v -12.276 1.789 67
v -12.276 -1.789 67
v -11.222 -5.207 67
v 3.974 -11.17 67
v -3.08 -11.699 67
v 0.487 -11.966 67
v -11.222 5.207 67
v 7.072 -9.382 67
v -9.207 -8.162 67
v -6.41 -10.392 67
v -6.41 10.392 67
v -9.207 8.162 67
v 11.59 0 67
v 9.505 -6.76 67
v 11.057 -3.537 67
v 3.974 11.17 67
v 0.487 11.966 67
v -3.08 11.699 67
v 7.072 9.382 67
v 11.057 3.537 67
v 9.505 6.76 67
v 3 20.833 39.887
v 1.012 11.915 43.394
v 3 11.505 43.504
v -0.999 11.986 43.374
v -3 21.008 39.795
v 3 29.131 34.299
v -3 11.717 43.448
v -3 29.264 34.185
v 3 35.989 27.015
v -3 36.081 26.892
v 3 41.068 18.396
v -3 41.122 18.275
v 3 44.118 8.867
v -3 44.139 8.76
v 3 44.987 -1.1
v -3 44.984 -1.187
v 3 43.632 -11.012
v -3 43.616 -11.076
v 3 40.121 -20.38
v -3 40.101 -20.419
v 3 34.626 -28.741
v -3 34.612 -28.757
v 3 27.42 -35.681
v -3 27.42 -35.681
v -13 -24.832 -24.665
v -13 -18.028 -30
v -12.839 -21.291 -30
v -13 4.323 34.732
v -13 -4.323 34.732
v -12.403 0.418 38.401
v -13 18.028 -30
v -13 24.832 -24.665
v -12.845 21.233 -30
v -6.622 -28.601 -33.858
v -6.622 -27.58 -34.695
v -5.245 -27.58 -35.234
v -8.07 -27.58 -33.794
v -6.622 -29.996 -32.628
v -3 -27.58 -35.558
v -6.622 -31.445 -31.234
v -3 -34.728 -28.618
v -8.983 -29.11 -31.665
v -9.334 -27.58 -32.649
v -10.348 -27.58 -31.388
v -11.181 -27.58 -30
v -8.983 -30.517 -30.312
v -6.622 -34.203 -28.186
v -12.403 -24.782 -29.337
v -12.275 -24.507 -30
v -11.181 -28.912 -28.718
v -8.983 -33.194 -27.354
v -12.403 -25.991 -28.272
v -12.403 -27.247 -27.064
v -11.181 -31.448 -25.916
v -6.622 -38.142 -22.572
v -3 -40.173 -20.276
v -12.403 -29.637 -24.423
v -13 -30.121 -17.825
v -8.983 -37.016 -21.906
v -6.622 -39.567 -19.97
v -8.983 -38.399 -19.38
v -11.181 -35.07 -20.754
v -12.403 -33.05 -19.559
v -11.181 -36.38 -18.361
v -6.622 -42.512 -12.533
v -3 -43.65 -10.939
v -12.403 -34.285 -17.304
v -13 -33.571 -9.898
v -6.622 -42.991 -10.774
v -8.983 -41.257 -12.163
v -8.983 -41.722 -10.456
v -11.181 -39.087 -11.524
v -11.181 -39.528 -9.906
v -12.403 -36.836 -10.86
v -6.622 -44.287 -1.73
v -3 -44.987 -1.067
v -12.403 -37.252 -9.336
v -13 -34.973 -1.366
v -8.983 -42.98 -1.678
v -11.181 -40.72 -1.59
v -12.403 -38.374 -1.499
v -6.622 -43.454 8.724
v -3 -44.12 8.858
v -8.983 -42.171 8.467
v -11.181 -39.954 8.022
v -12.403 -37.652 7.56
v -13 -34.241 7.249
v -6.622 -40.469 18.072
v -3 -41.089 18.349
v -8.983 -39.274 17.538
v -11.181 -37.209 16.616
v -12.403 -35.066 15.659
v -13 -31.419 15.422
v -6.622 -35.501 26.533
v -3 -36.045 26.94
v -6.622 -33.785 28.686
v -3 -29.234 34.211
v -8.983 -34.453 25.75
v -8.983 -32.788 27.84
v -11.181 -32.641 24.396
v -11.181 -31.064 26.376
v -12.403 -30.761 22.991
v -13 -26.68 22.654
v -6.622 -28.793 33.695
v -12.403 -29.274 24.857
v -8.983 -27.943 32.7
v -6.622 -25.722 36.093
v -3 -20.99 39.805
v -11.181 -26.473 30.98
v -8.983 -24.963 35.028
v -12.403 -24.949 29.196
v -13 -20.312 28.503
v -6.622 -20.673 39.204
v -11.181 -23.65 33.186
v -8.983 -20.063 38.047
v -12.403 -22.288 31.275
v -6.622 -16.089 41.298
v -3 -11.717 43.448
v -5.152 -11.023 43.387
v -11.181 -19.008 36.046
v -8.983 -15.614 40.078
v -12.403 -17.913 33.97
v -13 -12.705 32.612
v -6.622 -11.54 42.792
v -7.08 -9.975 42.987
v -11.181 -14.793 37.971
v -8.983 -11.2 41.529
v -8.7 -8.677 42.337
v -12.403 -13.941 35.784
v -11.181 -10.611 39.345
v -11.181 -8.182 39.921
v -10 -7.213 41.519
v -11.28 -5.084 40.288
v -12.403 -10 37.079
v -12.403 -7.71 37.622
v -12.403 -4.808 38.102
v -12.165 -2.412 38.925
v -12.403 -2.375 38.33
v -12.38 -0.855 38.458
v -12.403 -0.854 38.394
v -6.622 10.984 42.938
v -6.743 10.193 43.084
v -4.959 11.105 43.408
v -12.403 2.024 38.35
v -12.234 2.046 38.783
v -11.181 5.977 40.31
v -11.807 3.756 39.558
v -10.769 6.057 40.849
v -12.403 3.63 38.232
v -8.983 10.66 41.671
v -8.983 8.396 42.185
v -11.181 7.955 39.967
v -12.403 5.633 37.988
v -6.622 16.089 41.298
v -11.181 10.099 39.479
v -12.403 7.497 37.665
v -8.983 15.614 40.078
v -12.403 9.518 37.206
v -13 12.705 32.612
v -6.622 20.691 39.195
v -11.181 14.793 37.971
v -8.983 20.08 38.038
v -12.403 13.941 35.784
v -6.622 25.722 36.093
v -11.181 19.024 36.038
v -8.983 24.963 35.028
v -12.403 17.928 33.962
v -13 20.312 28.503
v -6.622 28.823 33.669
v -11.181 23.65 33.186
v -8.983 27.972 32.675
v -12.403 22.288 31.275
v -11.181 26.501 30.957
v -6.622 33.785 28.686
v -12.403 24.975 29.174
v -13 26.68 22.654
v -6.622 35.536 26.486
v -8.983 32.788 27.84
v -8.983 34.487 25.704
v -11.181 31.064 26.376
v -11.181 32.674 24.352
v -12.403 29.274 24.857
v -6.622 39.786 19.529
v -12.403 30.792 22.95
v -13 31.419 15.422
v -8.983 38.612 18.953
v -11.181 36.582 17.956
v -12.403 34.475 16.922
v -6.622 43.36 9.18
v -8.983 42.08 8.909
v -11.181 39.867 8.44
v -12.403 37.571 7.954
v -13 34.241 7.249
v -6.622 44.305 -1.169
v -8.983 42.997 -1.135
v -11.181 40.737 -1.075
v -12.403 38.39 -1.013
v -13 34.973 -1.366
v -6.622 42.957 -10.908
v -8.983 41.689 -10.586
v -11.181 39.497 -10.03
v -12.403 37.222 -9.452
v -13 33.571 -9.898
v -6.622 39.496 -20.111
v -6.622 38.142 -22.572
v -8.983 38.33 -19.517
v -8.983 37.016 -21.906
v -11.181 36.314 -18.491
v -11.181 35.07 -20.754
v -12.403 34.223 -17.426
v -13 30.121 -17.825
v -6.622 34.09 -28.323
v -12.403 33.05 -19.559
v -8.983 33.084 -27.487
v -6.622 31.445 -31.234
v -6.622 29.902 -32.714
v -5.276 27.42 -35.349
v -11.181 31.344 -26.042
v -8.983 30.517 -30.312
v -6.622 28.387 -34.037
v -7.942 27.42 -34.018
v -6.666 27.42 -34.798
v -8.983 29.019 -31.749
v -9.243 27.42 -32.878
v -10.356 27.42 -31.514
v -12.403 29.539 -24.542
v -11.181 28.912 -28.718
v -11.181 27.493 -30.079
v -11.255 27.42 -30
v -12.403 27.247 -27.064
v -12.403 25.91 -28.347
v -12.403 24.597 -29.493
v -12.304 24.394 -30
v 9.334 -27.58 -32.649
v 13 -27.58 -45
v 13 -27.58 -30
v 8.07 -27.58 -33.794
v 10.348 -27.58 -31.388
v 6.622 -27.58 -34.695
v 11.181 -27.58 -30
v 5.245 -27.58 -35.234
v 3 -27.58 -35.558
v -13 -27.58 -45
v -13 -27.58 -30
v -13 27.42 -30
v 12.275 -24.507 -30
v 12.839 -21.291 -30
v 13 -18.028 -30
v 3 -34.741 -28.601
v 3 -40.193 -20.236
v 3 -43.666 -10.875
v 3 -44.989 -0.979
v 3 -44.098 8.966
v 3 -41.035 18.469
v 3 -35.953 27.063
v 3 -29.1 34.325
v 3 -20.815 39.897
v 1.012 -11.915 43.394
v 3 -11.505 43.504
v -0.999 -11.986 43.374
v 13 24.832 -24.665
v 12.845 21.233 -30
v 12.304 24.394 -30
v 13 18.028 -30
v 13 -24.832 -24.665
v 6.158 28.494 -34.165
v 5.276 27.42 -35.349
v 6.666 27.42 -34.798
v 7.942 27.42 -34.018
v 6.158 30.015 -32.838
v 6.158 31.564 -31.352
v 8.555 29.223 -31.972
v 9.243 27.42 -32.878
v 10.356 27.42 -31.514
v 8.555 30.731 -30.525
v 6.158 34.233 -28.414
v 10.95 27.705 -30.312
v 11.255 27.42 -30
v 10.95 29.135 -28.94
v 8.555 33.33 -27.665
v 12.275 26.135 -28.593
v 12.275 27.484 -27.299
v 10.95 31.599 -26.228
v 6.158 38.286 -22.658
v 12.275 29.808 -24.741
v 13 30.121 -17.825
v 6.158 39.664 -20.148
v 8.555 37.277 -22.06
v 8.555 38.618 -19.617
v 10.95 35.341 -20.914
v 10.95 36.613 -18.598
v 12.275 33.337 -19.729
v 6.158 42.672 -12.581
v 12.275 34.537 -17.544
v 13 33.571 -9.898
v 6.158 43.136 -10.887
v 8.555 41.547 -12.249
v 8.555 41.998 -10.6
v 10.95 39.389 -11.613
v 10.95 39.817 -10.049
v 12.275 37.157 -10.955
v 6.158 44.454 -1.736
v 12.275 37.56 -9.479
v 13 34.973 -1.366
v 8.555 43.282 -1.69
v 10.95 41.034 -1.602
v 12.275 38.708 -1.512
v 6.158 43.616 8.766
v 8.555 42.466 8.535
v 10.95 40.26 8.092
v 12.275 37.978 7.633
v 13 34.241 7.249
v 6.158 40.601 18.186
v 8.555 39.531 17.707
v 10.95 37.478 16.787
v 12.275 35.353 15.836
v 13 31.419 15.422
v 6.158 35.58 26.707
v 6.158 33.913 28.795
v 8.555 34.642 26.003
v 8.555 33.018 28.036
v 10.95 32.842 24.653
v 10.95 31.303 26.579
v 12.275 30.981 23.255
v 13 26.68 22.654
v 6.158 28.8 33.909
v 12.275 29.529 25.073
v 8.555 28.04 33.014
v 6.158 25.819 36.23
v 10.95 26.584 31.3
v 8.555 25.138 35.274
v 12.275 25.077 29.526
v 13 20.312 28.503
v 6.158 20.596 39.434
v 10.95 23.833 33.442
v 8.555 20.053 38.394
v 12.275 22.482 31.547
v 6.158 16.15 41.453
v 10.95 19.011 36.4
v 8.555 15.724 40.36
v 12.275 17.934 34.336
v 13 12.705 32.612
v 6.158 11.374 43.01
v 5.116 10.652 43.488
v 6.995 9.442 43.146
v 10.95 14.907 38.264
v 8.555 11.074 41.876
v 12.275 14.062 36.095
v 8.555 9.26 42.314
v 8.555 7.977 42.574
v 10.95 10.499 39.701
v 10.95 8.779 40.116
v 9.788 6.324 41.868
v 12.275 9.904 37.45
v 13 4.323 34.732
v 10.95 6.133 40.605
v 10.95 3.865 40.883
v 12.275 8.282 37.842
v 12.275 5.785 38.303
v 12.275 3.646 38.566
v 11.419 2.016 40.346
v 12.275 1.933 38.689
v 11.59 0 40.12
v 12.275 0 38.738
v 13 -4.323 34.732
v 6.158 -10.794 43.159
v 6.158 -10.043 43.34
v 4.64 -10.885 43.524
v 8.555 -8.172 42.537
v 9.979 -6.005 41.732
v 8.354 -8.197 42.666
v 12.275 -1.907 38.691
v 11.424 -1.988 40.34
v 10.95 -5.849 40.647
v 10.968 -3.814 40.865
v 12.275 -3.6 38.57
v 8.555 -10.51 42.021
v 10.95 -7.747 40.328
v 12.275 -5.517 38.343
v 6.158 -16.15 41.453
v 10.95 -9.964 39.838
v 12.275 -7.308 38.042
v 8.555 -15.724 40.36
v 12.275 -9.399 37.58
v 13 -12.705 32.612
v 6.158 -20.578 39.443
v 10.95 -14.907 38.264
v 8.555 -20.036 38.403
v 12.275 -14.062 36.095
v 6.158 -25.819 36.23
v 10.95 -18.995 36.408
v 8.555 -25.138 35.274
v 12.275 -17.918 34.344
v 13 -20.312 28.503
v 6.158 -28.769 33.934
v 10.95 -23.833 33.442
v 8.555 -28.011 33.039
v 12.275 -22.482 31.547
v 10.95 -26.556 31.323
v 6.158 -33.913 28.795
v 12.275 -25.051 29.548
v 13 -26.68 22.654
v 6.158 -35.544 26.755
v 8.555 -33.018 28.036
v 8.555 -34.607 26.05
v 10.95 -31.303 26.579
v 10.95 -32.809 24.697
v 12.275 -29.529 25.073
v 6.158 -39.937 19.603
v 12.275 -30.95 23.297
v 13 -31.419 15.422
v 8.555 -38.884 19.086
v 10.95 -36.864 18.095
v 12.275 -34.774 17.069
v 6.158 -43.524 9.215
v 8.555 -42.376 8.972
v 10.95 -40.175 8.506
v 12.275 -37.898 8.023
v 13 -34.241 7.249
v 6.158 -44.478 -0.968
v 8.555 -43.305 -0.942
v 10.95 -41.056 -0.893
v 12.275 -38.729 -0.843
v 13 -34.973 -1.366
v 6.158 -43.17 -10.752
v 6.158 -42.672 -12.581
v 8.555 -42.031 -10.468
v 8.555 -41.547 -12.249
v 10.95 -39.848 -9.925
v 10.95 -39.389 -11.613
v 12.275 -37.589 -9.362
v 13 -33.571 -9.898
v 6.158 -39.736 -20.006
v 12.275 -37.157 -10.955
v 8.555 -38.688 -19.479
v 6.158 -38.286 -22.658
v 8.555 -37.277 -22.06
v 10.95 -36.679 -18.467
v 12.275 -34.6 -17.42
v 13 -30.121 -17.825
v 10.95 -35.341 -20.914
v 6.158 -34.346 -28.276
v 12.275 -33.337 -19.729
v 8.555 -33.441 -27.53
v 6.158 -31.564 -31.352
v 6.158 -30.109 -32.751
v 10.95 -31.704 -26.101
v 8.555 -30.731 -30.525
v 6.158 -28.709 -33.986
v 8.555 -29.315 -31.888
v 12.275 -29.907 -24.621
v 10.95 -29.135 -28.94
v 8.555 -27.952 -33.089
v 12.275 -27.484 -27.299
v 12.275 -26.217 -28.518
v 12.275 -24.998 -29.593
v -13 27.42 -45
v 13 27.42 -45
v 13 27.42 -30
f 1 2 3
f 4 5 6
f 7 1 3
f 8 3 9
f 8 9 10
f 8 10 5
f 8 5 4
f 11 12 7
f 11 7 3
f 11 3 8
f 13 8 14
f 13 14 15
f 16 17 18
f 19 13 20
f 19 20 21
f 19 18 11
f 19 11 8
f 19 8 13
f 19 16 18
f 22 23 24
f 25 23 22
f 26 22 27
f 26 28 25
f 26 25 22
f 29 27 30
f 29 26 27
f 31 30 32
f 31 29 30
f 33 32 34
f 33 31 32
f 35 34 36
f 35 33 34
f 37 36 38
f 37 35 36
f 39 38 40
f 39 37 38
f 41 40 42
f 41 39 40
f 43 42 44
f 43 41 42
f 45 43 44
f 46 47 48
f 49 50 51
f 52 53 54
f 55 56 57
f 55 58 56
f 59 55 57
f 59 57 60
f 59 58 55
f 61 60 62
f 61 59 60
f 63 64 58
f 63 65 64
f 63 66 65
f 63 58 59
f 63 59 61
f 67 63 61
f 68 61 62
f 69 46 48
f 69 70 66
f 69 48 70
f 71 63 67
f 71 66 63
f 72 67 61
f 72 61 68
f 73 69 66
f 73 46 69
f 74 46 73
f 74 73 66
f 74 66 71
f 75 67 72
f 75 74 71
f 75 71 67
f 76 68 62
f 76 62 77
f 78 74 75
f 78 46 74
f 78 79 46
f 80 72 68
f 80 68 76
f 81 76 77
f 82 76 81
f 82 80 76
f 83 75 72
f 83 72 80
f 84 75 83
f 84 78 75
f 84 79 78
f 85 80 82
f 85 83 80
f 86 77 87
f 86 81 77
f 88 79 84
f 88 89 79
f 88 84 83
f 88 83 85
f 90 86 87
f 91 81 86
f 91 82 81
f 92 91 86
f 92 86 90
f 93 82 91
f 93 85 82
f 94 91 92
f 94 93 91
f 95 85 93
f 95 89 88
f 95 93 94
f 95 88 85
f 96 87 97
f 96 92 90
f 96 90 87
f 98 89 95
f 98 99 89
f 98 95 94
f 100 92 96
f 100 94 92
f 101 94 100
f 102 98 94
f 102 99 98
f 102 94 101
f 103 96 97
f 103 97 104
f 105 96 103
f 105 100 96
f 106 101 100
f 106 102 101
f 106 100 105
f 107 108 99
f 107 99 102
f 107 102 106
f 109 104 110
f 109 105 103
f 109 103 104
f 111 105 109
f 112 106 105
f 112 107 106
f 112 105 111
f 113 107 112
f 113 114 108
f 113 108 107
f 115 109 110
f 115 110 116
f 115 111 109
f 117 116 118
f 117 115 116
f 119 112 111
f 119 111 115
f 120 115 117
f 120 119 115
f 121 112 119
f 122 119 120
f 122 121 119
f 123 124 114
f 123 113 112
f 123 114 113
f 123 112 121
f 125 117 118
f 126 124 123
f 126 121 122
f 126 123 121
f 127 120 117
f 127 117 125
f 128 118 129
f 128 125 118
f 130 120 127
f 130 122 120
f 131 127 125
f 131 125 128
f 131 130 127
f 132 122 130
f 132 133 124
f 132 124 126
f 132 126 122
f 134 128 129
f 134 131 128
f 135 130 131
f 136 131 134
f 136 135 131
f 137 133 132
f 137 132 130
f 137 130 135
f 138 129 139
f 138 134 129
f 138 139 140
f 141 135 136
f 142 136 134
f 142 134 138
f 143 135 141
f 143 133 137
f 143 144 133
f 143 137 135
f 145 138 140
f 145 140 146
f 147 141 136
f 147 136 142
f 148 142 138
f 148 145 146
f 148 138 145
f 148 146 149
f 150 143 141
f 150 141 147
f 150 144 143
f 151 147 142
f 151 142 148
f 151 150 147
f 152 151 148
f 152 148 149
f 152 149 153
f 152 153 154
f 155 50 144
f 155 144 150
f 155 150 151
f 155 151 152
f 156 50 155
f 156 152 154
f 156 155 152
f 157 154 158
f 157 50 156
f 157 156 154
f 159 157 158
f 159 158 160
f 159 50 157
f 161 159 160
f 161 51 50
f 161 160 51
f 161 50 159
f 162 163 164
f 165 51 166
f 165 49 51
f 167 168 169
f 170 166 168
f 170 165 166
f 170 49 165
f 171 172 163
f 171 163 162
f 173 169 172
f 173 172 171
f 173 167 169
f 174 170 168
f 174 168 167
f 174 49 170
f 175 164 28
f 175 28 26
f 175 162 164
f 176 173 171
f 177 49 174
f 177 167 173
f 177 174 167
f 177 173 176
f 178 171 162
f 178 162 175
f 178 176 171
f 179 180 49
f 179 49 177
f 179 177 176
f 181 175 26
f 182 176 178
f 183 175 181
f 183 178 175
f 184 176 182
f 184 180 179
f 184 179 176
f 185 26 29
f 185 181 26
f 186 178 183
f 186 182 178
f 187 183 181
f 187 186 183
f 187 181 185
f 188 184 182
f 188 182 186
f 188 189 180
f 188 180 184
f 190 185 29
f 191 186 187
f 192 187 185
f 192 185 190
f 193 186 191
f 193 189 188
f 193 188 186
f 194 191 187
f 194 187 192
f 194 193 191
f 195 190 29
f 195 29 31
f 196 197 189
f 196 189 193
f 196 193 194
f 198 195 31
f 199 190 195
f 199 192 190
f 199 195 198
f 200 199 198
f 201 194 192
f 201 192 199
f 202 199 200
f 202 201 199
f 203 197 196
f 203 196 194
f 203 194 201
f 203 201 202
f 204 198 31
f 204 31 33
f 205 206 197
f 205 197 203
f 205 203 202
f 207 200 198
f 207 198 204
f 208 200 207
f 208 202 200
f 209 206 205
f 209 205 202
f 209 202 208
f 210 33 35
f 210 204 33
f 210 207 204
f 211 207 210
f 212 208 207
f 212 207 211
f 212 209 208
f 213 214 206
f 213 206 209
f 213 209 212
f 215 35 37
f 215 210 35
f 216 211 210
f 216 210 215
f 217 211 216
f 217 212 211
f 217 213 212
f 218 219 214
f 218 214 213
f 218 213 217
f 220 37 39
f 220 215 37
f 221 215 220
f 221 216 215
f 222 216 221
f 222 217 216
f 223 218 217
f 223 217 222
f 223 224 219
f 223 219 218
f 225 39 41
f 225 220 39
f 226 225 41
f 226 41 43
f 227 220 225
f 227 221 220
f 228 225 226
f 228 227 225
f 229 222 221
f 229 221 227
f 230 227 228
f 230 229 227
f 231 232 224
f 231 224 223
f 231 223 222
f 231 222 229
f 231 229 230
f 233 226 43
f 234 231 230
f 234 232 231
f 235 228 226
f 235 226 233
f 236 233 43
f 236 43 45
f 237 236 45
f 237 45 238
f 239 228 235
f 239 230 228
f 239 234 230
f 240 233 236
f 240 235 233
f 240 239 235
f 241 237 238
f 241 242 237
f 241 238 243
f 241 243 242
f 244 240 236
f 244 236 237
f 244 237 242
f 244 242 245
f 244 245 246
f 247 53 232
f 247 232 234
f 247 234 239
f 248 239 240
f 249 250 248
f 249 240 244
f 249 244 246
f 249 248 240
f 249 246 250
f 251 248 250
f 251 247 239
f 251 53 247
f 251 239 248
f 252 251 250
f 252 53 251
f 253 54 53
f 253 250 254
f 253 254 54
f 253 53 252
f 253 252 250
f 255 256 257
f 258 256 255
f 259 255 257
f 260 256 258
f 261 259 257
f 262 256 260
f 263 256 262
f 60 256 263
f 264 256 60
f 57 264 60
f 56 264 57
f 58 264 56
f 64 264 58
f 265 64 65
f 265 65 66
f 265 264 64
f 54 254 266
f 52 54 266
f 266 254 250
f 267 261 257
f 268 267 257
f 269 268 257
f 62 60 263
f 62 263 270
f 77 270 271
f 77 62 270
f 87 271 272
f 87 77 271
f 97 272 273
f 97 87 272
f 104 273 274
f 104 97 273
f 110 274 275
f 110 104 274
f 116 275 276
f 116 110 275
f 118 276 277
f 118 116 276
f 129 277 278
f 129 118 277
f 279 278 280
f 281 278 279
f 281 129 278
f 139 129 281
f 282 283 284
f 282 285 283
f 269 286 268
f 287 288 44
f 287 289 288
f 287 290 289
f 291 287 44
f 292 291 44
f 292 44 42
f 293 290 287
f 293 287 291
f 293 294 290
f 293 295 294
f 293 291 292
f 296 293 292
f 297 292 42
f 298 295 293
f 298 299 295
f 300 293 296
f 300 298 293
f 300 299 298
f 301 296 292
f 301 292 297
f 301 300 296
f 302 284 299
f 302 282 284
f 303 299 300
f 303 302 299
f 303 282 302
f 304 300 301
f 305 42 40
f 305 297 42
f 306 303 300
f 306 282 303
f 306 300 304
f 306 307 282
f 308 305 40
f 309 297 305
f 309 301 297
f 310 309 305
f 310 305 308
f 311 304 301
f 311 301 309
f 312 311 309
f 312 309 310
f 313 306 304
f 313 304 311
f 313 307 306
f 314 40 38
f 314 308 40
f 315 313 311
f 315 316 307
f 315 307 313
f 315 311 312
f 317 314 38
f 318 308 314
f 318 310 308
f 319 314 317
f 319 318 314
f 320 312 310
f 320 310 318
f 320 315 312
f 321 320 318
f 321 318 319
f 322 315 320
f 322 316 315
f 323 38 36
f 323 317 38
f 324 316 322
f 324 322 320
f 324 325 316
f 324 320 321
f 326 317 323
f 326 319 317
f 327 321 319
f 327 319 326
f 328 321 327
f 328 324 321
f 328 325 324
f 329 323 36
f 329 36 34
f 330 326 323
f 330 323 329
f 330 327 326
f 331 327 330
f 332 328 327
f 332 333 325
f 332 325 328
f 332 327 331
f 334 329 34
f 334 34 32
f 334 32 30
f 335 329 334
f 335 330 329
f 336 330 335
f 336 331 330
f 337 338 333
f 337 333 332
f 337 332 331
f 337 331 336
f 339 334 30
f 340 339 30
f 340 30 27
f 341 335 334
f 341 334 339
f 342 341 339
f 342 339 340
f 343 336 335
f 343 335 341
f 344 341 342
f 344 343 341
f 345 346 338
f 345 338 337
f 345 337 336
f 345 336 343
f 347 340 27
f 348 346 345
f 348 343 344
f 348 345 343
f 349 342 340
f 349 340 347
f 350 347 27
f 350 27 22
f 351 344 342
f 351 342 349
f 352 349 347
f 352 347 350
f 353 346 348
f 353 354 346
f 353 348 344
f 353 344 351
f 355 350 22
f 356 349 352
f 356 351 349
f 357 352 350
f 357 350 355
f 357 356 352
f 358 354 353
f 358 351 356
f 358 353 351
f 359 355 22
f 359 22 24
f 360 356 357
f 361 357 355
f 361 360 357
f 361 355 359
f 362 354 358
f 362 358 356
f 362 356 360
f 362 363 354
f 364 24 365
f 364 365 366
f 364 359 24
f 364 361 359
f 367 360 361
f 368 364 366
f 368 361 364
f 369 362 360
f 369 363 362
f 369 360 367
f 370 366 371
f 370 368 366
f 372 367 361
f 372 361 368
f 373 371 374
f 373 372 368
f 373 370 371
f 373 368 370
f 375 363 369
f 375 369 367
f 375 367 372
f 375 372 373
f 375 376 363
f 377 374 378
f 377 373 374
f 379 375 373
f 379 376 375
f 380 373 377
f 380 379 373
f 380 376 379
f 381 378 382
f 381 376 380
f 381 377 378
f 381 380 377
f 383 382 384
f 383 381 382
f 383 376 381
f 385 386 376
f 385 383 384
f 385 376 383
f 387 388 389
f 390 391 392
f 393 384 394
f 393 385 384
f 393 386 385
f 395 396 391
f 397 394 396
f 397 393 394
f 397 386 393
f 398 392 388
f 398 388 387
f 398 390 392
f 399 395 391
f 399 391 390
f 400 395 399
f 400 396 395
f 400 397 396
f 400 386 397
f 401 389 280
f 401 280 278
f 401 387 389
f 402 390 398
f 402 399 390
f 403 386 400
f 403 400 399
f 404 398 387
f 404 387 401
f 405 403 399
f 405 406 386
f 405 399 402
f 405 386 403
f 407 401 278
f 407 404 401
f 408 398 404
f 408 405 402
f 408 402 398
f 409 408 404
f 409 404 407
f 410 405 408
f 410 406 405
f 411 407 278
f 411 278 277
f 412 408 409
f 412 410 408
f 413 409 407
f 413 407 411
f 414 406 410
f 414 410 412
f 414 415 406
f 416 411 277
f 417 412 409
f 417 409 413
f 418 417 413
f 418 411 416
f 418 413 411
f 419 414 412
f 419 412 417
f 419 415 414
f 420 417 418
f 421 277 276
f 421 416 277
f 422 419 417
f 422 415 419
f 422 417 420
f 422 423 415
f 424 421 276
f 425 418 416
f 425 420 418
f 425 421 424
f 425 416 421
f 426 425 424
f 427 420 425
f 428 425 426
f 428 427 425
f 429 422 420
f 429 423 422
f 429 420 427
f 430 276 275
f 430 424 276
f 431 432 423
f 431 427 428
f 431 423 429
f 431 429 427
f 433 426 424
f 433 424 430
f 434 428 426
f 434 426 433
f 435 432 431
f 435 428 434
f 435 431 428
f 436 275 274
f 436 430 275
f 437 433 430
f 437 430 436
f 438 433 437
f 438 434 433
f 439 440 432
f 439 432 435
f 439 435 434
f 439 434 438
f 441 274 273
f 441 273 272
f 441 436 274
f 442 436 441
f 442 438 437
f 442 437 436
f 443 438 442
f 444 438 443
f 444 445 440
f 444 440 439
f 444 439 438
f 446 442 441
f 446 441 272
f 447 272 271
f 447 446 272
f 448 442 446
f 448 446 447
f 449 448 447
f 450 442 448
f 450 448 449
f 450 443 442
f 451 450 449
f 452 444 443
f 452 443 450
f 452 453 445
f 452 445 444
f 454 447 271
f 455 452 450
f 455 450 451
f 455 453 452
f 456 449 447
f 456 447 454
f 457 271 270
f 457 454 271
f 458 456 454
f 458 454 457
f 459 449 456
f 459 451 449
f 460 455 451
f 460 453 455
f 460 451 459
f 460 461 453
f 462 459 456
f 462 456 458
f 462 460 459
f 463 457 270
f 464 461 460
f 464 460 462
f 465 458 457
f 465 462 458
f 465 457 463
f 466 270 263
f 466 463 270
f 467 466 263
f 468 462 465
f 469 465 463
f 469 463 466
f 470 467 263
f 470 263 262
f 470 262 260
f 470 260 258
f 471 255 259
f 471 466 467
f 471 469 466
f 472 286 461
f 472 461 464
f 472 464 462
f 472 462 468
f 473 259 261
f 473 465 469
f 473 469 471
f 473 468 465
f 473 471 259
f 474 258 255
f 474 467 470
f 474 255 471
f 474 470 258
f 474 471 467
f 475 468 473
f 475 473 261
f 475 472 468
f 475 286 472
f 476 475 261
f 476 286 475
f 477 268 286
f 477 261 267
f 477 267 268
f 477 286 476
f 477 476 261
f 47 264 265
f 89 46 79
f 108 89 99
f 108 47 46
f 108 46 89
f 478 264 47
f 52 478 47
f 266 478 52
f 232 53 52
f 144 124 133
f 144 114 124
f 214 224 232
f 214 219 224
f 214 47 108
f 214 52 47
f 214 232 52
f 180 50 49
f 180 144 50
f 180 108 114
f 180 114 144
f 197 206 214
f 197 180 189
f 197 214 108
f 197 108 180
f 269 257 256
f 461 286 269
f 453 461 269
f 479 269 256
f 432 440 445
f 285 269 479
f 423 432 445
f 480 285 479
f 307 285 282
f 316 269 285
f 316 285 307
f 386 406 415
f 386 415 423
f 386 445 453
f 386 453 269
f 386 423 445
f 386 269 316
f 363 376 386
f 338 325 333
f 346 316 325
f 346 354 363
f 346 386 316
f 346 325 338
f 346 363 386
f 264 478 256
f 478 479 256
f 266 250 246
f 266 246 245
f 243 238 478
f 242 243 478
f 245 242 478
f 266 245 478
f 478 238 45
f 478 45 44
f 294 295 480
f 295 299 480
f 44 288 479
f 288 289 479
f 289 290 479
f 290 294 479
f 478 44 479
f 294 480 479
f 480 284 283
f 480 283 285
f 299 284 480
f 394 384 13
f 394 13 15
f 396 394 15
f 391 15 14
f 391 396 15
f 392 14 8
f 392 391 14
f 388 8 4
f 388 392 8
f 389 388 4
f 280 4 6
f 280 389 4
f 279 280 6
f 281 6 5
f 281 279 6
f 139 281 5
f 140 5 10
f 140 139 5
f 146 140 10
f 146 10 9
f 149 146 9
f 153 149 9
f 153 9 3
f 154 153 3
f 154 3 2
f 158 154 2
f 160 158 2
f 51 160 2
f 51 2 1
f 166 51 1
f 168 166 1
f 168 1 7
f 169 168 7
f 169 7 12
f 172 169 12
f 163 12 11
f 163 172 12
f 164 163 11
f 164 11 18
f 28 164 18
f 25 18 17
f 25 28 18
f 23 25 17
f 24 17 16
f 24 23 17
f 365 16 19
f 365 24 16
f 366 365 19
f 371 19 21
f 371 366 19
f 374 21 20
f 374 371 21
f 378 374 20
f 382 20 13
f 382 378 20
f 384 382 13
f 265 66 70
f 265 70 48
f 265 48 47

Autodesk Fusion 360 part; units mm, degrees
sketch "Sketch1" plane through (0, 0, 0) normal (1, 0, 0) x (0, 1, 0)
  circle A0 centre (0, 0) radius 45
  line L0 (27.4205, -45) -> (-27.5795, -45)
  line L1 (-27.5795, -45) -> (-27.5795, -30)
  line L2 (-27.5795, -30) -> (27.4205, -30)
  line L3 (27.4205, -30) -> (27.4205, -45)
  dimension "d8" = 90
  dimension "d10" = 55
  dimension "d11" = 15
cylinder "CylinderPrimitive1" add diameter 90 height 13 placed x (0, 0, -1) y (0, 1, 0) z (1, 0, 0) at (0, 0, 0) makes body 1
fillet "Fillet1" radius 10 1 edges at (13, -16.2727, 41.9547) on bodies 1
extrude "Extrude1" add sketch "Sketch1" along normal blind 13 contours A0 L1 L2 L3 | A0 L0 L1 | A0 L0 L3 picked at (-0.053, -35) bodies 1
cylinder "CylinderPrimitive2" add diameter 90 height 13 placed x (0, 0, 1) y (0, 1, 0) z (-1, 0, 0) at (0, 0, 0) bodies 1
fillet "Fillet2" radius 10 1 edges at (-13, -16.2727, -41.9547) on bodies 1
extrude "Extrude2" add sketch "Sketch1" against normal blind 13 contours A0 L1 L2 L3 | A0 L0 L1 | A0 L0 L3 picked at (-0.053, -35) bodies 1
ref_plane "WorkPlane1" through (-0.4102, 0, 45) normal (0, 0, 1) x (0, 1, 0)
sketch "Sketch5" plane through (-0.4102, 0, 45) normal (0, 0, 1) x (1, 0, 0)
  circle A0 centre (0, 0) radius 12
  dimension "d26" = 24
extrude "Extrude3" add sketch "Sketch5" against normal blind 10 bodies 1
extrude "Extrude4" add 1 faces at (0.1622, 3.9888, 45) along direction (0, 0, 1) blind 22 on bodies 1 bodies 1
copy_body "Body->Comp1" bodies 1 removing the originals makes body 2 in component "Component"
component "Component" placed x (1, 0, 0) y (0, 1, 0) z (0, 0, 1) at (0, 0, 0)
equation "start_dia = 80 mm"
equation "diameter = 90 mm"
equation "base_length = 55 mm"
equation "base_depth = 26 mm"
equation "top_dia = 24 mm"
equation "top_length = 22 mm"
equation "base_height = 15 mm"
equation "d8 = diameter"
equation "d10 = base_length"
equation "d11 = base_height"
equation "d12 = base_depth / 2"
equation "d16 = diameter - start_dia"
equation "d17 = base_depth / 2"
equation "d19 = base_depth / 2"
equation "d23 = -base_depth / 2"
equation "d26 = top_dia"
equation "d29 = top_length"
